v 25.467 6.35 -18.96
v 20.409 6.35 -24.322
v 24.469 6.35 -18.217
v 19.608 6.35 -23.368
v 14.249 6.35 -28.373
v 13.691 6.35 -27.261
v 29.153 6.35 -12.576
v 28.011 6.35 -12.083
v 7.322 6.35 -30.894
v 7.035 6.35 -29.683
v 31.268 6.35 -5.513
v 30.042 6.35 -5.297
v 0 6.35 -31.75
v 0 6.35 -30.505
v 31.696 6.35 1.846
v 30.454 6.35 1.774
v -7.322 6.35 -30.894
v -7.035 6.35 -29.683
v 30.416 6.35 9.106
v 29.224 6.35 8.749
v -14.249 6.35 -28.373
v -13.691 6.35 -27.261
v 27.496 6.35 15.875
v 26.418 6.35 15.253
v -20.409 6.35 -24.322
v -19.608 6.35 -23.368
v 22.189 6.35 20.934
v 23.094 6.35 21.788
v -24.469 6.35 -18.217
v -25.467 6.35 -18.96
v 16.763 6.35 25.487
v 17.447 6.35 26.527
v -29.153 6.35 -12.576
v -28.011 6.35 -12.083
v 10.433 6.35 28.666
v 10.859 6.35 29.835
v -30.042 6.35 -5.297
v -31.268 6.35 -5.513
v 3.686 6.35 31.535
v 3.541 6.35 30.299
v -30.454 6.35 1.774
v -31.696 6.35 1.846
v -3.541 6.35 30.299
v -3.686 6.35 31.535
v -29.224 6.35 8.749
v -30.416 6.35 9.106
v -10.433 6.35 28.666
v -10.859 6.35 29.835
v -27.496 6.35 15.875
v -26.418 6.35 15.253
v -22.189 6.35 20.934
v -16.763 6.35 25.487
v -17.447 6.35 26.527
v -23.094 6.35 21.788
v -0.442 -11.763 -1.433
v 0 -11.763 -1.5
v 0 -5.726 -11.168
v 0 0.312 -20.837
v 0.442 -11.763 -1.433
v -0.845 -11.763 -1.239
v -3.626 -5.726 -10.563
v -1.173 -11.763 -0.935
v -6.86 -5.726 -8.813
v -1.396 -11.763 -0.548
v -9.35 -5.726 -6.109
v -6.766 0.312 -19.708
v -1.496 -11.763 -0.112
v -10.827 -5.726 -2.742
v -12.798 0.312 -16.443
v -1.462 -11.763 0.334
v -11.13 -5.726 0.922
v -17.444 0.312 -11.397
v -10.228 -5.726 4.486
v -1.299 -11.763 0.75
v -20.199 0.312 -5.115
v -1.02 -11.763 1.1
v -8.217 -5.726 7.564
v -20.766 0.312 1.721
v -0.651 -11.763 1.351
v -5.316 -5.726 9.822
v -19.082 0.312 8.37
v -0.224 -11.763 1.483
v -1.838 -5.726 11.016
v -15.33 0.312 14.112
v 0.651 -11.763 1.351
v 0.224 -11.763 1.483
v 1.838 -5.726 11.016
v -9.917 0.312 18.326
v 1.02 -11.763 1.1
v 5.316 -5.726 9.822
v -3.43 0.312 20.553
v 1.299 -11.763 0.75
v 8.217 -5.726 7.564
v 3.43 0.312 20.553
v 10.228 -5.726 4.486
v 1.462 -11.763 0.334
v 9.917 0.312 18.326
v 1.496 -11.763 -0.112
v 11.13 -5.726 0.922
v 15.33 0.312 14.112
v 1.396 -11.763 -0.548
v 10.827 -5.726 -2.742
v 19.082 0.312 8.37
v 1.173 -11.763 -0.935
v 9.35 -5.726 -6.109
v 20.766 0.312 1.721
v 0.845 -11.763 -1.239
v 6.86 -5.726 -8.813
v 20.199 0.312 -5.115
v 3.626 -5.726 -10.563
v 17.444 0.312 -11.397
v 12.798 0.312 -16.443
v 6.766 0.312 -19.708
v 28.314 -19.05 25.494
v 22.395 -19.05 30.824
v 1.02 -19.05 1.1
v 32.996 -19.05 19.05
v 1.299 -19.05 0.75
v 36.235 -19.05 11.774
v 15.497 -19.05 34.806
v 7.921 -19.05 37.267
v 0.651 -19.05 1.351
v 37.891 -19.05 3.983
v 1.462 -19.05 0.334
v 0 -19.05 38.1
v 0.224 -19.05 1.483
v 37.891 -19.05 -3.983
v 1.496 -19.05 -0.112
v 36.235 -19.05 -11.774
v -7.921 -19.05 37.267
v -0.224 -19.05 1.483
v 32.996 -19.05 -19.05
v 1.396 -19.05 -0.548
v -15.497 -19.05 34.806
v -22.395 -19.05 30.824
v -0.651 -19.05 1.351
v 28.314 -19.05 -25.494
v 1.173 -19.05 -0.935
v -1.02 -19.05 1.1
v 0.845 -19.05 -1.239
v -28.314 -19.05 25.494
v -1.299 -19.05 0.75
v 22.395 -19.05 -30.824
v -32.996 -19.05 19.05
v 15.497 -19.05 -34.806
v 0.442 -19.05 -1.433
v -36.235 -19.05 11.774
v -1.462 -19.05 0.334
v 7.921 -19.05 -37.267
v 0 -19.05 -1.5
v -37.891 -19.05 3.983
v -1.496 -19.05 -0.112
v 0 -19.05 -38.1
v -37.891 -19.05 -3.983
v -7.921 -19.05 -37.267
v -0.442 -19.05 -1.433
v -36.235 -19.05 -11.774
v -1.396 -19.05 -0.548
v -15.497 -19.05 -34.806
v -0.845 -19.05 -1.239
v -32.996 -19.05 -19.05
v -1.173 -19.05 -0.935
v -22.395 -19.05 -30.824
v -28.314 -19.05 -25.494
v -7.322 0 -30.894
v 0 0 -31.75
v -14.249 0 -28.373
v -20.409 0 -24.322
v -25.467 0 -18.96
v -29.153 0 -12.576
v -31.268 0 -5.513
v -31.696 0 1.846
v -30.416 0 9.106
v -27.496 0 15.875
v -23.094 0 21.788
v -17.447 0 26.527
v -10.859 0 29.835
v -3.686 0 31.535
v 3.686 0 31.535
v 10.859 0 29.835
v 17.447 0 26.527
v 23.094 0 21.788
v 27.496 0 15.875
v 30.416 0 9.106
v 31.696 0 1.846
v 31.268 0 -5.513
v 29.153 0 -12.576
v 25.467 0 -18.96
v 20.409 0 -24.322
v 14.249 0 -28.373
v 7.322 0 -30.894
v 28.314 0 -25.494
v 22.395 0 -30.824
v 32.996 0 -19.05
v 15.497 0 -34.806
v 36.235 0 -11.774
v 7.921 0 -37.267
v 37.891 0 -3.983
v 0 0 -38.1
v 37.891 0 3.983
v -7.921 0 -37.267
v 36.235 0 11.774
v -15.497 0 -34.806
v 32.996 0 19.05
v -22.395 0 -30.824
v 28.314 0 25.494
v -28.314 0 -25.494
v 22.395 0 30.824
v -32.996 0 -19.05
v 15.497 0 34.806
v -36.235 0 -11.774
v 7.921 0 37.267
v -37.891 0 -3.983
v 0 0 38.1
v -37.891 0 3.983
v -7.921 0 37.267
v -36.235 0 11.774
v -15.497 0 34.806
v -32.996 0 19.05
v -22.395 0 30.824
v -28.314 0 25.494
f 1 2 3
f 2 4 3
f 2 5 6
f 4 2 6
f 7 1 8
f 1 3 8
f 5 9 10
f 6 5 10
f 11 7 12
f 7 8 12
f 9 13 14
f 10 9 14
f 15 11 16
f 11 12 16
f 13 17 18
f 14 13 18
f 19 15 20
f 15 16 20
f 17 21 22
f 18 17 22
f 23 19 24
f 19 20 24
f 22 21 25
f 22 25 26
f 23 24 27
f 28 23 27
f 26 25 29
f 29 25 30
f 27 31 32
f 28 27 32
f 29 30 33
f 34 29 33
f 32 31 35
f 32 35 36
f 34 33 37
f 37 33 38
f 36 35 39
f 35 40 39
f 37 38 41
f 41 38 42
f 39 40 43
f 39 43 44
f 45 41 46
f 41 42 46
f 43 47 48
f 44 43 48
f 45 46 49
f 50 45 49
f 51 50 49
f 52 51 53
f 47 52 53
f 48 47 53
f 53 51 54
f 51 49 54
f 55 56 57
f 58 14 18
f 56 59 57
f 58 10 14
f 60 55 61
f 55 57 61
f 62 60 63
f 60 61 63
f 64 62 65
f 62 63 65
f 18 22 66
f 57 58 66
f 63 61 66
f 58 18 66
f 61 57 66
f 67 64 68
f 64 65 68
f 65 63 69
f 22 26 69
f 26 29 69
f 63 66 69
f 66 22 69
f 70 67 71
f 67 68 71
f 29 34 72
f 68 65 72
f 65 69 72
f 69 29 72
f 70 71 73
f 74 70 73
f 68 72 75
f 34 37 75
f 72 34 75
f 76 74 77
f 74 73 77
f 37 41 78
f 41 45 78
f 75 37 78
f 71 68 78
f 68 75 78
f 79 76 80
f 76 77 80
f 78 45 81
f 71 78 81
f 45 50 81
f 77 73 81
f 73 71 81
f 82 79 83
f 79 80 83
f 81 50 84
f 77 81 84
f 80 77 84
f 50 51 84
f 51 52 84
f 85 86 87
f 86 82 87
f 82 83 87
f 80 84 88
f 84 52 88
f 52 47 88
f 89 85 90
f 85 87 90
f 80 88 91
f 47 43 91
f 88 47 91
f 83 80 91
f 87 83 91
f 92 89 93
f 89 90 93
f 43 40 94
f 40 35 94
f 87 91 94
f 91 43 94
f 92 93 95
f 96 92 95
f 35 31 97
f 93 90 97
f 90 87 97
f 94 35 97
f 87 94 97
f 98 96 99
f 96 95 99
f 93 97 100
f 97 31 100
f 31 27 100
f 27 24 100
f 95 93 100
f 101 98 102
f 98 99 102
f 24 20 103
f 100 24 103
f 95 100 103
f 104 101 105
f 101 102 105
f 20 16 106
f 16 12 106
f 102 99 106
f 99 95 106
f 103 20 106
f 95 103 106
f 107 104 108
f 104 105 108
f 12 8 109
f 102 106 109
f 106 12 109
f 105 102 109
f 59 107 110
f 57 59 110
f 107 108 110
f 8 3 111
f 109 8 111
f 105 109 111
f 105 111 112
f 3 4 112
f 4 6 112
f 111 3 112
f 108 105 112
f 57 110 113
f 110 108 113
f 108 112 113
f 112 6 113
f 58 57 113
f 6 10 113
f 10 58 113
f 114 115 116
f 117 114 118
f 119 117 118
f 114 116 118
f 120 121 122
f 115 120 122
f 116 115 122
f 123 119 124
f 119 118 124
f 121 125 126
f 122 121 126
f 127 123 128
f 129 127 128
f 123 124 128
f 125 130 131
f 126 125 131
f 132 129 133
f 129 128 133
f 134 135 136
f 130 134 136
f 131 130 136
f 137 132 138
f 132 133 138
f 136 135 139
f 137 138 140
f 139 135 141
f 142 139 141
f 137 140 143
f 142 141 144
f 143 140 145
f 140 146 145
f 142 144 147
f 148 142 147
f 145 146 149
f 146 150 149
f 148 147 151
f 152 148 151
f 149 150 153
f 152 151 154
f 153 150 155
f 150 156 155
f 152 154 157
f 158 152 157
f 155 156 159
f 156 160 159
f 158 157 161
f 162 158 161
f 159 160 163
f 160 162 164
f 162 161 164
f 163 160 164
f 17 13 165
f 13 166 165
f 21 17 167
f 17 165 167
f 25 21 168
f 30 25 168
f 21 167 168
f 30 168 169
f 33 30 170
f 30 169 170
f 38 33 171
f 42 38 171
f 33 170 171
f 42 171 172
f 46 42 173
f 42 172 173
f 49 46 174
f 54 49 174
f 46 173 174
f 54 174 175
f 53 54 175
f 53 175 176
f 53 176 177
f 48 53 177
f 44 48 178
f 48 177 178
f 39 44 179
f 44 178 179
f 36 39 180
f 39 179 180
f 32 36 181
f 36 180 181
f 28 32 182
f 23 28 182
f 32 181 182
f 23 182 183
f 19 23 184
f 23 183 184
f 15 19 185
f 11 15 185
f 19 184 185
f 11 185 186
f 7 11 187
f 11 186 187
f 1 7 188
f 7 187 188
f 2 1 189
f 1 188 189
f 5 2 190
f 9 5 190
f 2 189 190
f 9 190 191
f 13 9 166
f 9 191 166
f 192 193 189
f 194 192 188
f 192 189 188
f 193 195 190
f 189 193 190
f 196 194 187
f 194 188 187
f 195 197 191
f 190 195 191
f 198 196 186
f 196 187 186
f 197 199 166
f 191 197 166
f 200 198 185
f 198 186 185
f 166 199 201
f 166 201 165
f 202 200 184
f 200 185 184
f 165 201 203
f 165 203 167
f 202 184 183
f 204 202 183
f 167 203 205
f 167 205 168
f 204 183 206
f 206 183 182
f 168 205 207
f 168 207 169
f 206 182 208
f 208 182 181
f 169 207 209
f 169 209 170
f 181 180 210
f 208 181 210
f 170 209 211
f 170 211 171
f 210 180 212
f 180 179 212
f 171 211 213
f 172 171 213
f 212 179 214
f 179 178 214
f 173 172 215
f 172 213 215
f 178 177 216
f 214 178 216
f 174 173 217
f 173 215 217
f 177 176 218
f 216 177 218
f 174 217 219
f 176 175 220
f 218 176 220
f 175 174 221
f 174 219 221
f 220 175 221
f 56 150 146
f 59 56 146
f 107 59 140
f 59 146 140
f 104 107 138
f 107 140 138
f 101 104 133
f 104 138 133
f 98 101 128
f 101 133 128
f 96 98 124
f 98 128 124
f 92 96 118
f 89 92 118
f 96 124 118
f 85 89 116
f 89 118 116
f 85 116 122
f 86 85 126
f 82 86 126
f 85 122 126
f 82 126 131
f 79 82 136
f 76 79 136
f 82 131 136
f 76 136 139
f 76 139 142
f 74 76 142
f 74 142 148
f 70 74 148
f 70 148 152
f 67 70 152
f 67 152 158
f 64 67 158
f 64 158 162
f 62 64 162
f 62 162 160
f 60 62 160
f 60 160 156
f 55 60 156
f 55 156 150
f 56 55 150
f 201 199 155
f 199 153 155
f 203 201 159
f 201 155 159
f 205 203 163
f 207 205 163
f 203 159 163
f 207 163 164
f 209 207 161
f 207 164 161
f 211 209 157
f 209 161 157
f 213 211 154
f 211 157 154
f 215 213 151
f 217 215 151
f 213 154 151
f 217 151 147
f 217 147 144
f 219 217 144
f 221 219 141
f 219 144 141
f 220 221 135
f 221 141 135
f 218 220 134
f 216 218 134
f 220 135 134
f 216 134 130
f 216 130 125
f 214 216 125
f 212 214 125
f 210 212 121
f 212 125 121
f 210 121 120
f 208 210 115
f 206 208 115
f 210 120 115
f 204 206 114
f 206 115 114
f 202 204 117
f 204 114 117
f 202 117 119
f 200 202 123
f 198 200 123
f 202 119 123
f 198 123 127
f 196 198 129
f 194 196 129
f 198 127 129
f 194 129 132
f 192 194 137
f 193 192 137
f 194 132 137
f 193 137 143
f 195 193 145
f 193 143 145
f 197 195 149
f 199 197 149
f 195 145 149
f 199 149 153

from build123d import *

# Parameters (mm, degrees)
SKETCH2_R          = 1.5
CUT_EXTRUDE1_DEPTH = 60.56828015


with BuildPart() as part:
    # Sketch1 → Revolve1 (revolve)
    with BuildSketch(Plane.XY, mode=Mode.PRIVATE) as revolve1_sk:
        Polygon((0, -12.7), (30.5054, 6.35), (31.75, 6.35), (31.75, 0), (38.1, 0), (38.1, -19.05), (0, -19.05), align=None)
    revolve(revolve1_sk.sketch.rotate(Axis((0, -19.05, 0), (0, 1, 0)), 90), axis=Axis((0, -19.05, 0), (0, 1, 0)))

    # Sketch2 → Cut-Extrude1 (cut, through all)
    with BuildSketch(Plane.XZ.offset(19.05)):
        with Locations(Location((0, 0, 0), (0, 0, 270))):
            Circle(SKETCH2_R)
    extrude(amount=-CUT_EXTRUDE1_DEPTH, mode=Mode.SUBTRACT)


solid = part.part
